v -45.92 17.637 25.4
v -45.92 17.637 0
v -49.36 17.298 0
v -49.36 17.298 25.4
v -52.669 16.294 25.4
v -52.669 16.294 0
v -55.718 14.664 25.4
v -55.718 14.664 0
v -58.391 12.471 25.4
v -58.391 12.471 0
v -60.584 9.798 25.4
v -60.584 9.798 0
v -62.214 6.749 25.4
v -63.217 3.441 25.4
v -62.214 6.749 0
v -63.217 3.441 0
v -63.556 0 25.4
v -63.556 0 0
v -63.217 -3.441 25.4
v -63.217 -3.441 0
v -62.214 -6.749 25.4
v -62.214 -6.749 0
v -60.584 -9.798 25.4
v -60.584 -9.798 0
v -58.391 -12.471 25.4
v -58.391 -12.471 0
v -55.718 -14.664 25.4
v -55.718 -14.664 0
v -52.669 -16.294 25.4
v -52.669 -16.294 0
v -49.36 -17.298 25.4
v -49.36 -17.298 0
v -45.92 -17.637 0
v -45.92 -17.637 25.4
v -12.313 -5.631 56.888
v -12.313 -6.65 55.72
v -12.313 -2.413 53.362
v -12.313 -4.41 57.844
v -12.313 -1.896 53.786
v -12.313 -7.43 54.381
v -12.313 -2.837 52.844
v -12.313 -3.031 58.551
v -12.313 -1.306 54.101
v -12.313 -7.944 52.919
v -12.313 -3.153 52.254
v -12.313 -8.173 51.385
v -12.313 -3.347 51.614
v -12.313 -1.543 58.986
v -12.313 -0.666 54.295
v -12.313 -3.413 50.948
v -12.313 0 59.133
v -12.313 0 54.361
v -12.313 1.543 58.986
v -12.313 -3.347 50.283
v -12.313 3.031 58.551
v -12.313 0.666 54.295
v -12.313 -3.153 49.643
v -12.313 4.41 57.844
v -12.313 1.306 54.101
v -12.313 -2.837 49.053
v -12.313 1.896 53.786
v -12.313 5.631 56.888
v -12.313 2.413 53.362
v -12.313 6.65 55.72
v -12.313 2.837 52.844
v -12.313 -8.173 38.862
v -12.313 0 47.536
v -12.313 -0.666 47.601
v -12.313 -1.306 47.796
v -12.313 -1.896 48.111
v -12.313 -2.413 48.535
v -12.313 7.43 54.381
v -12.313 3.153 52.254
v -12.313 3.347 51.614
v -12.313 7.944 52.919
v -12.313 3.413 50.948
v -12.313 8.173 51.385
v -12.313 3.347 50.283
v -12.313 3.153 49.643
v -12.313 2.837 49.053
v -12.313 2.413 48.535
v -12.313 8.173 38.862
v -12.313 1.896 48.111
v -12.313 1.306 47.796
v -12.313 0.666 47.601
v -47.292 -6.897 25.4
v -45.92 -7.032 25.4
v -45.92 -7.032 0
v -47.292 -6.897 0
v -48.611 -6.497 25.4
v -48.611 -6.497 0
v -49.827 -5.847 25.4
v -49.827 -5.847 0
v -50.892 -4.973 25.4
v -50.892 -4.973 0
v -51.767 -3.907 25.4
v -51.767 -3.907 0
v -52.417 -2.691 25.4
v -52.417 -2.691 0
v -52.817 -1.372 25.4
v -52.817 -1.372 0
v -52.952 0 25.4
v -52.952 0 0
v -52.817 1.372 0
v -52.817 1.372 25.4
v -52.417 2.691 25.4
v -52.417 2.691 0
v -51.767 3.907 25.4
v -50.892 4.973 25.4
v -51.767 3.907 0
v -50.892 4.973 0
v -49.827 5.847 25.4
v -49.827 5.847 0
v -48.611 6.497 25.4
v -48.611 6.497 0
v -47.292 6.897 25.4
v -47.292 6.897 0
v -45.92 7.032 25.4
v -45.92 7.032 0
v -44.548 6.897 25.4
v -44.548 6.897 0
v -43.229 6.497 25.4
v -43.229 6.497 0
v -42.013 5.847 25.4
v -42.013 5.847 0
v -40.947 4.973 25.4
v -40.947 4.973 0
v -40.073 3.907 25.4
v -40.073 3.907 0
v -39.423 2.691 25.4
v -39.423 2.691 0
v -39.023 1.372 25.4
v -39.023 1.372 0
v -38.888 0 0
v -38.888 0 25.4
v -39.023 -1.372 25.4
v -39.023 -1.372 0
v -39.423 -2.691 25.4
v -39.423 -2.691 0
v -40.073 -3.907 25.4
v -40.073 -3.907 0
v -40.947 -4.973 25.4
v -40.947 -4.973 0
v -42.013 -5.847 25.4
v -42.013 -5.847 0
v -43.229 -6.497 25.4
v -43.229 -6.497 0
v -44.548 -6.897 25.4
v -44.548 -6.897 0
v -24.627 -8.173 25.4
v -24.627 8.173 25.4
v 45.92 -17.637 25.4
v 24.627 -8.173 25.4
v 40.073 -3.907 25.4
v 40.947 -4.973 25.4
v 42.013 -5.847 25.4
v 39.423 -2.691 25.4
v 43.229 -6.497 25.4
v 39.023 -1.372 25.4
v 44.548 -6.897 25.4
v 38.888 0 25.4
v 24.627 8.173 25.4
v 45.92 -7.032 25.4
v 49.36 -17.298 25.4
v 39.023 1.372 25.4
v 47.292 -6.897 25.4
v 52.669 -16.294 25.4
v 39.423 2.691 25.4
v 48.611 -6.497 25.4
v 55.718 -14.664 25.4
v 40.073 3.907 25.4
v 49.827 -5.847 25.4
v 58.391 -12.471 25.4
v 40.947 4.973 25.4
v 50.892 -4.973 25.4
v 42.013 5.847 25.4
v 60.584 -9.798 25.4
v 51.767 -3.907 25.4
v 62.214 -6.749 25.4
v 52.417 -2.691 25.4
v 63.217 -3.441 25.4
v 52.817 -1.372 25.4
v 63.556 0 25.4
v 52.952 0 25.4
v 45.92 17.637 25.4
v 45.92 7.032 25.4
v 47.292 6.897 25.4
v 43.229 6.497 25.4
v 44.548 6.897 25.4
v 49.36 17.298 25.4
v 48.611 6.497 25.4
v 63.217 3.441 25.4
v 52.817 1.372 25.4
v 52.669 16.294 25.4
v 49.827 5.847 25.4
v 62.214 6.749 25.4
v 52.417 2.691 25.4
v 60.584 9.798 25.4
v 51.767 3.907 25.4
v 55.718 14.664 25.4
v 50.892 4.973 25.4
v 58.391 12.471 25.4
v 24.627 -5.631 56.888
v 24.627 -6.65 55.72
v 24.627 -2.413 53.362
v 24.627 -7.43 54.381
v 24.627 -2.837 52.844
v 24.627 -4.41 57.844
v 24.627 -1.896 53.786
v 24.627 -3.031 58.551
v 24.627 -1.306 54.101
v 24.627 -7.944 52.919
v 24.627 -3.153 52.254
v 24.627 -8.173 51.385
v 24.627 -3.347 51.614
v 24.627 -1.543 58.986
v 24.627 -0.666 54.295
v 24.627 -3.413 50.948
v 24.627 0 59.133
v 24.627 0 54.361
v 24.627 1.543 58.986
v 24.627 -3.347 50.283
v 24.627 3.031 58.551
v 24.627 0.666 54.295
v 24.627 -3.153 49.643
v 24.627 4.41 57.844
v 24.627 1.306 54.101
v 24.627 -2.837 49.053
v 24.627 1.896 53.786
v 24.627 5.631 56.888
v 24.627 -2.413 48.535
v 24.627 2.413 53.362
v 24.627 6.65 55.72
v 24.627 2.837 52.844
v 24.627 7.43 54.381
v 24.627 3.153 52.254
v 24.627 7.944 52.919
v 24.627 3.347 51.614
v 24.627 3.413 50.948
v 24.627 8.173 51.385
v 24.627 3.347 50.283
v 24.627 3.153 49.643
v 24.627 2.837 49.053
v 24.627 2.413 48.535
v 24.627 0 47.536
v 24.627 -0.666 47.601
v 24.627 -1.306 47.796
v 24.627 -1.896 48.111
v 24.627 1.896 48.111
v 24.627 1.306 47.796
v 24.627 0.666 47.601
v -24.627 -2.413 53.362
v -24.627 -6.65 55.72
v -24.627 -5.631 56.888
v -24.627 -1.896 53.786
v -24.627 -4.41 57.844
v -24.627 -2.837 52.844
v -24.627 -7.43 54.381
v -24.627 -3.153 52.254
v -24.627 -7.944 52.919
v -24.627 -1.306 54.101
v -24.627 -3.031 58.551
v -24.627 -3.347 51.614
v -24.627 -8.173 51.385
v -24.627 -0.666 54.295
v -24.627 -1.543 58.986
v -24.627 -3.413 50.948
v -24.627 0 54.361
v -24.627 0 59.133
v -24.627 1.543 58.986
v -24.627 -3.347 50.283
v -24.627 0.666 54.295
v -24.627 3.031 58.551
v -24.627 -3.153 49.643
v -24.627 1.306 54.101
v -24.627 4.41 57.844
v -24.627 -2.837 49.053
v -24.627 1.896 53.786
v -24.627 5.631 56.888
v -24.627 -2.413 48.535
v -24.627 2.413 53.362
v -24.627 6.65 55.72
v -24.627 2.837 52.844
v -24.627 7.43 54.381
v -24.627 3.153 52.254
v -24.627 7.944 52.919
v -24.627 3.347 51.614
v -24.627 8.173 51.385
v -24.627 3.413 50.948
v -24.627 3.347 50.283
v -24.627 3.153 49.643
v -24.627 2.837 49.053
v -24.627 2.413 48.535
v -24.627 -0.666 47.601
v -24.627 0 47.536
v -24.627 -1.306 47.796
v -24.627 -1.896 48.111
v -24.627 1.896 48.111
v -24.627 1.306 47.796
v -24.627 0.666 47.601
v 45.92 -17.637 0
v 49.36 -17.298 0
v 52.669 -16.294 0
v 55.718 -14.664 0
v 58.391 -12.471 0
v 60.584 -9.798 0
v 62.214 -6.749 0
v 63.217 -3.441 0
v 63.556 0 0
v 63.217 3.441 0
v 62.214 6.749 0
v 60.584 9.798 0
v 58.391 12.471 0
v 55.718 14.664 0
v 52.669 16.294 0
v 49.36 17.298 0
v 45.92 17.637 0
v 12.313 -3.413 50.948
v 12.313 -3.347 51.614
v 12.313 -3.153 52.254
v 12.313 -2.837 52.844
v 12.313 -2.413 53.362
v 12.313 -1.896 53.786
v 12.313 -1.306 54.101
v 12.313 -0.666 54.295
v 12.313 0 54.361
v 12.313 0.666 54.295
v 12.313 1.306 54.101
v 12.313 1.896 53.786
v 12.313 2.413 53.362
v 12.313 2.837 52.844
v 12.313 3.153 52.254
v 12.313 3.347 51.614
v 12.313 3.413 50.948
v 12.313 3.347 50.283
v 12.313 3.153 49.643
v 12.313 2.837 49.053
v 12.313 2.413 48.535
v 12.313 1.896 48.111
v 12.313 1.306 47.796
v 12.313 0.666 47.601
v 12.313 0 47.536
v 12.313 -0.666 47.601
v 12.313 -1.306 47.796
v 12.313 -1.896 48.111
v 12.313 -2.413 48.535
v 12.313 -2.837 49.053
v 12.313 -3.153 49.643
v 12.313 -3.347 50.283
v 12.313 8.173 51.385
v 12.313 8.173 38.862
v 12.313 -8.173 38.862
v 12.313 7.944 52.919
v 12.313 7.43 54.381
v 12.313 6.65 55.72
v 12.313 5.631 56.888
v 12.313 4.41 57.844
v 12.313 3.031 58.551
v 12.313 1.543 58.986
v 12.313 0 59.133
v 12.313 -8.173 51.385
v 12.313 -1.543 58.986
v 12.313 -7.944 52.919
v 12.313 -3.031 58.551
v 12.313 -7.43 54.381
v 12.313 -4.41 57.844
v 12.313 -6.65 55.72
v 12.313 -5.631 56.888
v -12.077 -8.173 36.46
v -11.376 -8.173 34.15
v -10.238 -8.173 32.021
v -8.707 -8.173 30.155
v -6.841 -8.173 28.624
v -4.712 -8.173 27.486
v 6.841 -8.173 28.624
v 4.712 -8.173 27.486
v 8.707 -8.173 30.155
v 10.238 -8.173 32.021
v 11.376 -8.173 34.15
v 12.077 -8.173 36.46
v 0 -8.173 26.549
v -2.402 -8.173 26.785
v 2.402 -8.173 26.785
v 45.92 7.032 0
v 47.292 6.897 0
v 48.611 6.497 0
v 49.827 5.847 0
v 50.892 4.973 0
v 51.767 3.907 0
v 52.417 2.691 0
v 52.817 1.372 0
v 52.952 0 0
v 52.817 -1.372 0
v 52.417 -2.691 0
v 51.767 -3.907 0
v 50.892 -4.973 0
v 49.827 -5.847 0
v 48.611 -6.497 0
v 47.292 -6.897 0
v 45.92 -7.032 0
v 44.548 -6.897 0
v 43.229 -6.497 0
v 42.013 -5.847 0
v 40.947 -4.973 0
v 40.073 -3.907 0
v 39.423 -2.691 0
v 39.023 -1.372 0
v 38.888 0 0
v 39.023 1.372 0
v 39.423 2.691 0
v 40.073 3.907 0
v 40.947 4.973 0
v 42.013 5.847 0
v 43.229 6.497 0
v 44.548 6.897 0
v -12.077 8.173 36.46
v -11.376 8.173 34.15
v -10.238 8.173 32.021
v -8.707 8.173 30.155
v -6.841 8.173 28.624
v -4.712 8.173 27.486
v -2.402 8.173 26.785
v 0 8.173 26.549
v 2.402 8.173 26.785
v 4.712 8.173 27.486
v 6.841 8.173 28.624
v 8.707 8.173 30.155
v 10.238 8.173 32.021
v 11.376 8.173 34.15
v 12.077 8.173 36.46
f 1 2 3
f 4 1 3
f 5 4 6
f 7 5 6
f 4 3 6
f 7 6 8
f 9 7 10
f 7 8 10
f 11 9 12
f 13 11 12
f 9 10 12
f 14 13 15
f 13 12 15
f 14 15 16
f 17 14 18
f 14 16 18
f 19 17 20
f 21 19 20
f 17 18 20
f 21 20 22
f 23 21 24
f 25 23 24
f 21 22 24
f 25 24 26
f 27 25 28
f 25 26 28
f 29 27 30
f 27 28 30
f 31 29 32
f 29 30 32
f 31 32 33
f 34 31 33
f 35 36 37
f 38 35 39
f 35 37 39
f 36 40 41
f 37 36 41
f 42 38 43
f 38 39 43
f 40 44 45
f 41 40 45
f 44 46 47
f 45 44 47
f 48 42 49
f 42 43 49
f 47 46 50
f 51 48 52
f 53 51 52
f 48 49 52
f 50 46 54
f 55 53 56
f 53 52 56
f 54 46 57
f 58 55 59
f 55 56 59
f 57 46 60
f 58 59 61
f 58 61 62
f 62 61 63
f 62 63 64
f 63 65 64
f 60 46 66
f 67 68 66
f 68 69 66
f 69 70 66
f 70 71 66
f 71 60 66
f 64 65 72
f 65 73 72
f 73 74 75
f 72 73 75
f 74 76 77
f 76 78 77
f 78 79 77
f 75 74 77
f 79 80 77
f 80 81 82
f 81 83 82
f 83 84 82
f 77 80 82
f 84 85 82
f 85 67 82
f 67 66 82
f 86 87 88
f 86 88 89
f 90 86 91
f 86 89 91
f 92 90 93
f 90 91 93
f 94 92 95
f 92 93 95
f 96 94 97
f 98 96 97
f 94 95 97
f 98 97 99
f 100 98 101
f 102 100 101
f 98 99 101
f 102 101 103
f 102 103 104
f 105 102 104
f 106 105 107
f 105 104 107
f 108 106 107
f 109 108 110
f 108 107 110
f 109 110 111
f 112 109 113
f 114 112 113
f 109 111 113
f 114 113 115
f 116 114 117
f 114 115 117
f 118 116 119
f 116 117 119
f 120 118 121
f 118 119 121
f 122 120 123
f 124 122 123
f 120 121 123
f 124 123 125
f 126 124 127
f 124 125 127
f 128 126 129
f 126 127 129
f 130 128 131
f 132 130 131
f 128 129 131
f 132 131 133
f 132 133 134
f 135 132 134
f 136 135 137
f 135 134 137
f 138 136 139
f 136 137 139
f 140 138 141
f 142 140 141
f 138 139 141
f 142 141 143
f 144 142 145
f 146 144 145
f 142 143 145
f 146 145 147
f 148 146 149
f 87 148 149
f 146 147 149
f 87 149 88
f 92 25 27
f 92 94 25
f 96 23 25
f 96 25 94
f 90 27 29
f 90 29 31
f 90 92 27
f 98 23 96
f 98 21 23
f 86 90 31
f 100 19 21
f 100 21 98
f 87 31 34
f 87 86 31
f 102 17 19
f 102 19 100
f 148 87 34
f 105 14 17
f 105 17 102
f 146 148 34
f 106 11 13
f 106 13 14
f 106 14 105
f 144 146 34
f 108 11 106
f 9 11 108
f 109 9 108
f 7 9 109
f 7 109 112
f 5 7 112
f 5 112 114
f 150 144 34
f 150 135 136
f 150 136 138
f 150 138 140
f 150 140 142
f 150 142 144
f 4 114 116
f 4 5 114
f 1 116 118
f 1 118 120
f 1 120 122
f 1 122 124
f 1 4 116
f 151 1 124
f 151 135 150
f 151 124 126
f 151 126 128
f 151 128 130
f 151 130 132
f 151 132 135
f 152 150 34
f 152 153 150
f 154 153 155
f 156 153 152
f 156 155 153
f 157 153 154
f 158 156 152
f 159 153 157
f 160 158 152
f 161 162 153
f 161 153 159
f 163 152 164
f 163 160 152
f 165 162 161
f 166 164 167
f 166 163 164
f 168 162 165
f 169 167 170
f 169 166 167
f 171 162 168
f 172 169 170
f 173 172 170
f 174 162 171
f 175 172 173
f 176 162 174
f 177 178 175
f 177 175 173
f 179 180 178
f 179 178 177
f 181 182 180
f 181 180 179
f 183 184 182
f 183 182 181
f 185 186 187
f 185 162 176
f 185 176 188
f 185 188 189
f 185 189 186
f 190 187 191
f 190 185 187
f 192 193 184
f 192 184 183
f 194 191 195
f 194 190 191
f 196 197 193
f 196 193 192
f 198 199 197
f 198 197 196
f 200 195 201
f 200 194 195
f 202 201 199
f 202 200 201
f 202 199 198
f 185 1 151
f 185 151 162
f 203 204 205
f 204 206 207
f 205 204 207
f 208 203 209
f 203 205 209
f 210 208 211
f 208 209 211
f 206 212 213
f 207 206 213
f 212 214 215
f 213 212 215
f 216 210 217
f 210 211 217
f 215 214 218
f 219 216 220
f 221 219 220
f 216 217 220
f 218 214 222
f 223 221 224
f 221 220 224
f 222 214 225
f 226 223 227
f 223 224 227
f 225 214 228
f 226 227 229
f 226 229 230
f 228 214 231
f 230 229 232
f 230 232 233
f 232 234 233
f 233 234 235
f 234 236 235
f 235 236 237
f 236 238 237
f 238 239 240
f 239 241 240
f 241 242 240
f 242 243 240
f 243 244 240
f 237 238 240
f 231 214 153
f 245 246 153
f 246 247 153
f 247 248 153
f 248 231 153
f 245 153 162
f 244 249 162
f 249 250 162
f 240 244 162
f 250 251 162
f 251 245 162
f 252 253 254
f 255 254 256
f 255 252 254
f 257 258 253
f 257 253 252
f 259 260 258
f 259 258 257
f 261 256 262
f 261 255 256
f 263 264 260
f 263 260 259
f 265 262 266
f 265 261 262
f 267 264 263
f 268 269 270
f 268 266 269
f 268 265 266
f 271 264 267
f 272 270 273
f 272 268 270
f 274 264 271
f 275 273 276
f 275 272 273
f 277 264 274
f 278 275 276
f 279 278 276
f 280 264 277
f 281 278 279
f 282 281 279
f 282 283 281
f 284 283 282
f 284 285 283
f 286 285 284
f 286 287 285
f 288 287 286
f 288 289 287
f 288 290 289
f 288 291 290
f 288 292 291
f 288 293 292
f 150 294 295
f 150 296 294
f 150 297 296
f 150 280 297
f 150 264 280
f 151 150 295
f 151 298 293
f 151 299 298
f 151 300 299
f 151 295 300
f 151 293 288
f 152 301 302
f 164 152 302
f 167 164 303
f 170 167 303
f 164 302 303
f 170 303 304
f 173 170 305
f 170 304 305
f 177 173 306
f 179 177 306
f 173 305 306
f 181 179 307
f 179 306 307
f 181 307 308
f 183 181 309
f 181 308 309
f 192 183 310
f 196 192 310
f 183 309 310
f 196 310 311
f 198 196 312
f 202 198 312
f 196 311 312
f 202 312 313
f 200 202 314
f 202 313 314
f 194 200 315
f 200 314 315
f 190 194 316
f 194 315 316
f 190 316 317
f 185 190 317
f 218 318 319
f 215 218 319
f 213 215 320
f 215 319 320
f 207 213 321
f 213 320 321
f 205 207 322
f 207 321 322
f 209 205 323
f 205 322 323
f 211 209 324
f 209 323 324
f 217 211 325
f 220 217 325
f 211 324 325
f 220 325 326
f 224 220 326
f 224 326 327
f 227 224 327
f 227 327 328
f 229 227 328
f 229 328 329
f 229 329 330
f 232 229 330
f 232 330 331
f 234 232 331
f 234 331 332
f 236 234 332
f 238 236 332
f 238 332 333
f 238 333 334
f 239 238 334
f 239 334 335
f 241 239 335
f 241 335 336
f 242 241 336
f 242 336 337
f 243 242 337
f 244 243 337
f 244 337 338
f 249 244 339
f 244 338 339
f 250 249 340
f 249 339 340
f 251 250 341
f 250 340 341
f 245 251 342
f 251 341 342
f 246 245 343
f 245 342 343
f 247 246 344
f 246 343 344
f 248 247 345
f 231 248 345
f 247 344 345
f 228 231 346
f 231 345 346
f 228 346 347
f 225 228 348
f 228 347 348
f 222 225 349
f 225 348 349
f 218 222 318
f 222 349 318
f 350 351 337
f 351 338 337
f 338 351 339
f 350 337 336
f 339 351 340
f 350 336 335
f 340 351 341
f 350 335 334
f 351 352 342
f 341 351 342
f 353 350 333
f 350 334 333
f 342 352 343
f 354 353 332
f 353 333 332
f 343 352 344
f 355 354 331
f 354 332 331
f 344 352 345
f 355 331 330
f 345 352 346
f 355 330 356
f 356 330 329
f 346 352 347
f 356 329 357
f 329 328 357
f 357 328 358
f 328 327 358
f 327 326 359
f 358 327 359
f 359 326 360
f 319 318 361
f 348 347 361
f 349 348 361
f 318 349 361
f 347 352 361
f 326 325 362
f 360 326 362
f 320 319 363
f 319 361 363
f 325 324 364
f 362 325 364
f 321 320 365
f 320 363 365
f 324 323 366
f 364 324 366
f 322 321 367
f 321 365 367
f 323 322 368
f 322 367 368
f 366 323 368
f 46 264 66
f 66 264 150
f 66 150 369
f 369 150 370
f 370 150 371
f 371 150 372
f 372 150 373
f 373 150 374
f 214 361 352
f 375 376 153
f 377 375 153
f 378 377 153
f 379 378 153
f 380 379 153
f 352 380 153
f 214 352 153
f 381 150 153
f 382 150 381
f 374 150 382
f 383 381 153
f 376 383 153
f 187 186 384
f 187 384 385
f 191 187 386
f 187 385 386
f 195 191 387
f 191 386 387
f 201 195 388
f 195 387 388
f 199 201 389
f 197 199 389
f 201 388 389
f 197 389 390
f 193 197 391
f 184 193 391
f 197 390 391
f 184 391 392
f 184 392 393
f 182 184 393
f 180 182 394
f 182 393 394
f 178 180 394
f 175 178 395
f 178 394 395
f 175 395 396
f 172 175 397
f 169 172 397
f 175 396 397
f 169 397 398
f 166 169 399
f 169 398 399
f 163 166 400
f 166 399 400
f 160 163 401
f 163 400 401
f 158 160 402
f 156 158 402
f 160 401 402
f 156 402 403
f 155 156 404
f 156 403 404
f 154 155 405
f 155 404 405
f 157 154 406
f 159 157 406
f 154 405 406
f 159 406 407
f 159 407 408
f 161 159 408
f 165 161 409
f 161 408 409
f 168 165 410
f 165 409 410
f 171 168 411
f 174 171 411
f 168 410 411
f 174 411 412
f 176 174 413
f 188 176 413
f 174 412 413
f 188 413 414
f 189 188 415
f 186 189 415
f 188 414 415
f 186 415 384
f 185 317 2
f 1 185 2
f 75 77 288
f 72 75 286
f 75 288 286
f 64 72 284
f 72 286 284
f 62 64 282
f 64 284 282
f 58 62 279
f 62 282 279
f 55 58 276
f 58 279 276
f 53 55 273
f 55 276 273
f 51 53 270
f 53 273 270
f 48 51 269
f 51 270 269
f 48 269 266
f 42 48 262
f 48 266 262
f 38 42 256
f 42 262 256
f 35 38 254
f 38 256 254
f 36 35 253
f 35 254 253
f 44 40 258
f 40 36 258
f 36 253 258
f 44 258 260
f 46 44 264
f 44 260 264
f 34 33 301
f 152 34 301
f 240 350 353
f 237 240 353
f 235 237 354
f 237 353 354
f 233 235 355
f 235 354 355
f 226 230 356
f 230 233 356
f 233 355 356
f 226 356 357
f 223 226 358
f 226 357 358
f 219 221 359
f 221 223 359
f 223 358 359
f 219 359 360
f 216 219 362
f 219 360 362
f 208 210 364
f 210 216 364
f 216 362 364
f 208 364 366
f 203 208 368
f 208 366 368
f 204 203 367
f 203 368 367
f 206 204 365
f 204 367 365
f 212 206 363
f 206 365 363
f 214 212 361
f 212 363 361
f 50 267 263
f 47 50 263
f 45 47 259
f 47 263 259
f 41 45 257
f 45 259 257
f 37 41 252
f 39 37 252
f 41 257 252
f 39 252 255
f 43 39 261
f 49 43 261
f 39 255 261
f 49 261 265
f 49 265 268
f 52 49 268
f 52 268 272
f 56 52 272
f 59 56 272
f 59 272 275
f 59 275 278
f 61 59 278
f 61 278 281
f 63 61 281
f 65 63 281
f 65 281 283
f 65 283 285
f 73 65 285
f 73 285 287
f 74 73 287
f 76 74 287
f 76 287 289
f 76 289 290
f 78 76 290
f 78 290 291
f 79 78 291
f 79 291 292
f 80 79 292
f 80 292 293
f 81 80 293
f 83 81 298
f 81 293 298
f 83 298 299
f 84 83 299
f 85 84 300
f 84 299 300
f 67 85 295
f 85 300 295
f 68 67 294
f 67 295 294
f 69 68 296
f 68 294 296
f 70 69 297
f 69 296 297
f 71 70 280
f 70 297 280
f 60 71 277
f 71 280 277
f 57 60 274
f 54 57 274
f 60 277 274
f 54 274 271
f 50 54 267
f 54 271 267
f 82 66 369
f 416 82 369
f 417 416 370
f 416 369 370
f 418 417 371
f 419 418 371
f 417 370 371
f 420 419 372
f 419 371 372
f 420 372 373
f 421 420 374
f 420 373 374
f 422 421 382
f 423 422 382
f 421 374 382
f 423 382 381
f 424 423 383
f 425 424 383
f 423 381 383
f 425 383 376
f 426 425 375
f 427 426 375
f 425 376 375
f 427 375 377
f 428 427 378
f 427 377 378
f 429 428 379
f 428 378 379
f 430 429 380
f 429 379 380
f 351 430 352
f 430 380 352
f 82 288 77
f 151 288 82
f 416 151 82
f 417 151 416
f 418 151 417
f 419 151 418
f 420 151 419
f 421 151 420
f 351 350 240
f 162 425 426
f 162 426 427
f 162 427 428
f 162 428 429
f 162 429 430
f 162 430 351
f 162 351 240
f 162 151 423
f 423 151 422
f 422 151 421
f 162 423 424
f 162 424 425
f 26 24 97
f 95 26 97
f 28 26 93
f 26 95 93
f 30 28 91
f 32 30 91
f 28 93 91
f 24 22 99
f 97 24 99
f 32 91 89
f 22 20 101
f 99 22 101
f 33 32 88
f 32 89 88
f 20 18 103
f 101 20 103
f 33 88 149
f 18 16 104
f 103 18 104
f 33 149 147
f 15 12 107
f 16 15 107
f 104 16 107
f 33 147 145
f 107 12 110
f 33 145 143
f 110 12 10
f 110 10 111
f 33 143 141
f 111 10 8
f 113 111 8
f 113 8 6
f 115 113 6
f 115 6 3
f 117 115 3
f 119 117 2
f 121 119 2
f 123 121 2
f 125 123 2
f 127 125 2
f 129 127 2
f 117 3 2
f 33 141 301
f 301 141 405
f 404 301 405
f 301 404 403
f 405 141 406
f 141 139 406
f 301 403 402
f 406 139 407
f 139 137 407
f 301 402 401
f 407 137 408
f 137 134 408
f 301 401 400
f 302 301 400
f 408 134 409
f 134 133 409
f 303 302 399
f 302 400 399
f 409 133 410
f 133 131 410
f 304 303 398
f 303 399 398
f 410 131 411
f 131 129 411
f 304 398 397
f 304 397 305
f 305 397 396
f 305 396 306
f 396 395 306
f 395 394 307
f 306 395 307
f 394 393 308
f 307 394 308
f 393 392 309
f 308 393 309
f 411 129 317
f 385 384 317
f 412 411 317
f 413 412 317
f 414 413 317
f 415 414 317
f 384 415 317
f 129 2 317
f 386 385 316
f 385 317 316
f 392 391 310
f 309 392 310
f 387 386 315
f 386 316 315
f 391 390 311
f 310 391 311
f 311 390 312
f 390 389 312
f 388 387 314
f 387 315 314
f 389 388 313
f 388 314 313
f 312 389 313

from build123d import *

# Parameters (mm, degrees)
F0_W     = 49.2534674704
F0_H     = 16.3461286575
F1_DEPTH = 25.4
F2_DEPTH = 43.942
F4_DEPTH = 25.4
F5_DEPTH = 16.51
F7_DEPTH = 78.486
F8_R     = 3.4125622967
F9_DEPTH = 57.15


with BuildPart() as f1:
    # F0 (on Top) → F1 (new body)
    with BuildSketch(Plane.XY):
        with BuildLine():
            Line((45.9197200835, 7.0321863355), (45.9197200835, 17.6366120577))
            Line((45.9197200835, 17.6366120577), (-45.9197200835, 17.6366120577))
            Line((-45.9197200835, 17.6366120577), (-45.9197200835, 7.0321863355))
            ThreePointArc((-45.9197200835, 7.0321863355), (-40.9472134391, 4.9725066444), (-38.887533748, 0))
            ThreePointArc((-38.887533748, 0), (-40.9472134391, -4.9725066444), (-45.9197200835, -7.0321863355))
            Line((-45.9197200835, -7.0321863355), (-45.9197200835, -17.6366120577))
            Line((-45.9197200835, -17.6366120577), (45.9197200835, -17.6366120577))
            Line((45.9197200835, -17.6366120577), (45.9197200835, -7.0321863355))
            ThreePointArc((45.9197200835, -7.0321863355), (38.887533748, 0), (45.9197200835, 7.0321863355))
        make_face()
        Rectangle(F0_W, F0_H, mode=Mode.SUBTRACT)
        with BuildLine():
            ThreePointArc((45.9197200835, -17.6366120577), (63.5563321412, 0), (45.9197200835, 17.6366120577))
            Line((45.9197200835, 17.6366120577), (45.9197200835, 7.0321863355))
            ThreePointArc((45.9197200835, 7.0321863355), (50.8922267279, 4.9725066444), (52.951906419, 0))
            ThreePointArc((52.951906419, 0), (50.8922267279, -4.9725066444), (45.9197200835, -7.0321863355))
            Line((45.9197200835, -7.0321863355), (45.9197200835, -17.6366120577))
        make_face()
        with BuildLine():
            Line((-45.9197200835, 7.0321863355), (-45.9197200835, 17.6366120577))
            ThreePointArc((-45.9197200835, 17.6366120577), (-63.5563321412, 0), (-45.9197200835, -17.6366120577))
            Line((-45.9197200835, -17.6366120577), (-45.9197200835, -7.0321863355))
            ThreePointArc((-45.9197200835, -7.0321863355), (-52.951906419, 0), (-45.9197200835, 7.0321863355))
        make_face()
    extrude(amount=F1_DEPTH)

    # F0 (on Top) → F2 (join)
    with BuildSketch(Plane.XY):
        Rectangle(F0_W, F0_H)
    extrude(amount=F2_DEPTH)

    # F3 (on face) → F4 (cut)
    with BuildSketch(Plane.XZ.offset(8.1730643287)):
        with BuildLine():
            Line((0, 43.942), (-12.3133668676, 43.942))
            Line((-12.3133668676, 43.942), (-12.3133668676, 38.862))
            ThreePointArc((-12.3133668676, 38.862), (0, 26.5486331324), (12.3133668676, 38.862))
            Line((12.3133668676, 38.862), (12.3133668676, 43.942))
            Line((12.3133668676, 43.942), (0, 43.942))
        make_face()
    extrude(amount=-F4_DEPTH, mode=Mode.SUBTRACT)

    # F5 (add): faces of the model
    f5_faces = [f1.faces().sort_by_distance(p)[0] for p in [
        (-18.4700503014, 0, 43.942),
        (18.4700503014, 0, 43.942),
    ]]
    extrude(f5_faces, amount=F5_DEPTH)

    # F6 (on face) → F7 (cut)
    with BuildSketch(Plane(origin=(-24.6267337352, 0, 0), x_dir=(0, -1, 0), z_dir=(-1, 0, 0))):
        with BuildLine():
            ThreePointArc((-8.1730643287, 51.3854473829), (0, 59.1332048708), (8.1730643287, 51.3854473829))
            Line((8.1730643287, 51.3854473829), (8.1730643287, 60.452))
            Line((8.1730643287, 60.452), (-8.1730643287, 60.452))
            Line((-8.1730643287, 60.452), (-8.1730643287, 51.3854473829))
        make_face()
    extrude(amount=-F7_DEPTH, mode=Mode.SUBTRACT)

    # F8 (on face) → F9 (cut)
    with BuildSketch(Plane(origin=(-24.6267337352, 0, 0), x_dir=(0, -1, 0), z_dir=(-1, 0, 0))):
        with Locations((0, 50.9484671056)):
            Circle(F8_R)
    extrude(amount=-F9_DEPTH, mode=Mode.SUBTRACT)


solid = f1.part
